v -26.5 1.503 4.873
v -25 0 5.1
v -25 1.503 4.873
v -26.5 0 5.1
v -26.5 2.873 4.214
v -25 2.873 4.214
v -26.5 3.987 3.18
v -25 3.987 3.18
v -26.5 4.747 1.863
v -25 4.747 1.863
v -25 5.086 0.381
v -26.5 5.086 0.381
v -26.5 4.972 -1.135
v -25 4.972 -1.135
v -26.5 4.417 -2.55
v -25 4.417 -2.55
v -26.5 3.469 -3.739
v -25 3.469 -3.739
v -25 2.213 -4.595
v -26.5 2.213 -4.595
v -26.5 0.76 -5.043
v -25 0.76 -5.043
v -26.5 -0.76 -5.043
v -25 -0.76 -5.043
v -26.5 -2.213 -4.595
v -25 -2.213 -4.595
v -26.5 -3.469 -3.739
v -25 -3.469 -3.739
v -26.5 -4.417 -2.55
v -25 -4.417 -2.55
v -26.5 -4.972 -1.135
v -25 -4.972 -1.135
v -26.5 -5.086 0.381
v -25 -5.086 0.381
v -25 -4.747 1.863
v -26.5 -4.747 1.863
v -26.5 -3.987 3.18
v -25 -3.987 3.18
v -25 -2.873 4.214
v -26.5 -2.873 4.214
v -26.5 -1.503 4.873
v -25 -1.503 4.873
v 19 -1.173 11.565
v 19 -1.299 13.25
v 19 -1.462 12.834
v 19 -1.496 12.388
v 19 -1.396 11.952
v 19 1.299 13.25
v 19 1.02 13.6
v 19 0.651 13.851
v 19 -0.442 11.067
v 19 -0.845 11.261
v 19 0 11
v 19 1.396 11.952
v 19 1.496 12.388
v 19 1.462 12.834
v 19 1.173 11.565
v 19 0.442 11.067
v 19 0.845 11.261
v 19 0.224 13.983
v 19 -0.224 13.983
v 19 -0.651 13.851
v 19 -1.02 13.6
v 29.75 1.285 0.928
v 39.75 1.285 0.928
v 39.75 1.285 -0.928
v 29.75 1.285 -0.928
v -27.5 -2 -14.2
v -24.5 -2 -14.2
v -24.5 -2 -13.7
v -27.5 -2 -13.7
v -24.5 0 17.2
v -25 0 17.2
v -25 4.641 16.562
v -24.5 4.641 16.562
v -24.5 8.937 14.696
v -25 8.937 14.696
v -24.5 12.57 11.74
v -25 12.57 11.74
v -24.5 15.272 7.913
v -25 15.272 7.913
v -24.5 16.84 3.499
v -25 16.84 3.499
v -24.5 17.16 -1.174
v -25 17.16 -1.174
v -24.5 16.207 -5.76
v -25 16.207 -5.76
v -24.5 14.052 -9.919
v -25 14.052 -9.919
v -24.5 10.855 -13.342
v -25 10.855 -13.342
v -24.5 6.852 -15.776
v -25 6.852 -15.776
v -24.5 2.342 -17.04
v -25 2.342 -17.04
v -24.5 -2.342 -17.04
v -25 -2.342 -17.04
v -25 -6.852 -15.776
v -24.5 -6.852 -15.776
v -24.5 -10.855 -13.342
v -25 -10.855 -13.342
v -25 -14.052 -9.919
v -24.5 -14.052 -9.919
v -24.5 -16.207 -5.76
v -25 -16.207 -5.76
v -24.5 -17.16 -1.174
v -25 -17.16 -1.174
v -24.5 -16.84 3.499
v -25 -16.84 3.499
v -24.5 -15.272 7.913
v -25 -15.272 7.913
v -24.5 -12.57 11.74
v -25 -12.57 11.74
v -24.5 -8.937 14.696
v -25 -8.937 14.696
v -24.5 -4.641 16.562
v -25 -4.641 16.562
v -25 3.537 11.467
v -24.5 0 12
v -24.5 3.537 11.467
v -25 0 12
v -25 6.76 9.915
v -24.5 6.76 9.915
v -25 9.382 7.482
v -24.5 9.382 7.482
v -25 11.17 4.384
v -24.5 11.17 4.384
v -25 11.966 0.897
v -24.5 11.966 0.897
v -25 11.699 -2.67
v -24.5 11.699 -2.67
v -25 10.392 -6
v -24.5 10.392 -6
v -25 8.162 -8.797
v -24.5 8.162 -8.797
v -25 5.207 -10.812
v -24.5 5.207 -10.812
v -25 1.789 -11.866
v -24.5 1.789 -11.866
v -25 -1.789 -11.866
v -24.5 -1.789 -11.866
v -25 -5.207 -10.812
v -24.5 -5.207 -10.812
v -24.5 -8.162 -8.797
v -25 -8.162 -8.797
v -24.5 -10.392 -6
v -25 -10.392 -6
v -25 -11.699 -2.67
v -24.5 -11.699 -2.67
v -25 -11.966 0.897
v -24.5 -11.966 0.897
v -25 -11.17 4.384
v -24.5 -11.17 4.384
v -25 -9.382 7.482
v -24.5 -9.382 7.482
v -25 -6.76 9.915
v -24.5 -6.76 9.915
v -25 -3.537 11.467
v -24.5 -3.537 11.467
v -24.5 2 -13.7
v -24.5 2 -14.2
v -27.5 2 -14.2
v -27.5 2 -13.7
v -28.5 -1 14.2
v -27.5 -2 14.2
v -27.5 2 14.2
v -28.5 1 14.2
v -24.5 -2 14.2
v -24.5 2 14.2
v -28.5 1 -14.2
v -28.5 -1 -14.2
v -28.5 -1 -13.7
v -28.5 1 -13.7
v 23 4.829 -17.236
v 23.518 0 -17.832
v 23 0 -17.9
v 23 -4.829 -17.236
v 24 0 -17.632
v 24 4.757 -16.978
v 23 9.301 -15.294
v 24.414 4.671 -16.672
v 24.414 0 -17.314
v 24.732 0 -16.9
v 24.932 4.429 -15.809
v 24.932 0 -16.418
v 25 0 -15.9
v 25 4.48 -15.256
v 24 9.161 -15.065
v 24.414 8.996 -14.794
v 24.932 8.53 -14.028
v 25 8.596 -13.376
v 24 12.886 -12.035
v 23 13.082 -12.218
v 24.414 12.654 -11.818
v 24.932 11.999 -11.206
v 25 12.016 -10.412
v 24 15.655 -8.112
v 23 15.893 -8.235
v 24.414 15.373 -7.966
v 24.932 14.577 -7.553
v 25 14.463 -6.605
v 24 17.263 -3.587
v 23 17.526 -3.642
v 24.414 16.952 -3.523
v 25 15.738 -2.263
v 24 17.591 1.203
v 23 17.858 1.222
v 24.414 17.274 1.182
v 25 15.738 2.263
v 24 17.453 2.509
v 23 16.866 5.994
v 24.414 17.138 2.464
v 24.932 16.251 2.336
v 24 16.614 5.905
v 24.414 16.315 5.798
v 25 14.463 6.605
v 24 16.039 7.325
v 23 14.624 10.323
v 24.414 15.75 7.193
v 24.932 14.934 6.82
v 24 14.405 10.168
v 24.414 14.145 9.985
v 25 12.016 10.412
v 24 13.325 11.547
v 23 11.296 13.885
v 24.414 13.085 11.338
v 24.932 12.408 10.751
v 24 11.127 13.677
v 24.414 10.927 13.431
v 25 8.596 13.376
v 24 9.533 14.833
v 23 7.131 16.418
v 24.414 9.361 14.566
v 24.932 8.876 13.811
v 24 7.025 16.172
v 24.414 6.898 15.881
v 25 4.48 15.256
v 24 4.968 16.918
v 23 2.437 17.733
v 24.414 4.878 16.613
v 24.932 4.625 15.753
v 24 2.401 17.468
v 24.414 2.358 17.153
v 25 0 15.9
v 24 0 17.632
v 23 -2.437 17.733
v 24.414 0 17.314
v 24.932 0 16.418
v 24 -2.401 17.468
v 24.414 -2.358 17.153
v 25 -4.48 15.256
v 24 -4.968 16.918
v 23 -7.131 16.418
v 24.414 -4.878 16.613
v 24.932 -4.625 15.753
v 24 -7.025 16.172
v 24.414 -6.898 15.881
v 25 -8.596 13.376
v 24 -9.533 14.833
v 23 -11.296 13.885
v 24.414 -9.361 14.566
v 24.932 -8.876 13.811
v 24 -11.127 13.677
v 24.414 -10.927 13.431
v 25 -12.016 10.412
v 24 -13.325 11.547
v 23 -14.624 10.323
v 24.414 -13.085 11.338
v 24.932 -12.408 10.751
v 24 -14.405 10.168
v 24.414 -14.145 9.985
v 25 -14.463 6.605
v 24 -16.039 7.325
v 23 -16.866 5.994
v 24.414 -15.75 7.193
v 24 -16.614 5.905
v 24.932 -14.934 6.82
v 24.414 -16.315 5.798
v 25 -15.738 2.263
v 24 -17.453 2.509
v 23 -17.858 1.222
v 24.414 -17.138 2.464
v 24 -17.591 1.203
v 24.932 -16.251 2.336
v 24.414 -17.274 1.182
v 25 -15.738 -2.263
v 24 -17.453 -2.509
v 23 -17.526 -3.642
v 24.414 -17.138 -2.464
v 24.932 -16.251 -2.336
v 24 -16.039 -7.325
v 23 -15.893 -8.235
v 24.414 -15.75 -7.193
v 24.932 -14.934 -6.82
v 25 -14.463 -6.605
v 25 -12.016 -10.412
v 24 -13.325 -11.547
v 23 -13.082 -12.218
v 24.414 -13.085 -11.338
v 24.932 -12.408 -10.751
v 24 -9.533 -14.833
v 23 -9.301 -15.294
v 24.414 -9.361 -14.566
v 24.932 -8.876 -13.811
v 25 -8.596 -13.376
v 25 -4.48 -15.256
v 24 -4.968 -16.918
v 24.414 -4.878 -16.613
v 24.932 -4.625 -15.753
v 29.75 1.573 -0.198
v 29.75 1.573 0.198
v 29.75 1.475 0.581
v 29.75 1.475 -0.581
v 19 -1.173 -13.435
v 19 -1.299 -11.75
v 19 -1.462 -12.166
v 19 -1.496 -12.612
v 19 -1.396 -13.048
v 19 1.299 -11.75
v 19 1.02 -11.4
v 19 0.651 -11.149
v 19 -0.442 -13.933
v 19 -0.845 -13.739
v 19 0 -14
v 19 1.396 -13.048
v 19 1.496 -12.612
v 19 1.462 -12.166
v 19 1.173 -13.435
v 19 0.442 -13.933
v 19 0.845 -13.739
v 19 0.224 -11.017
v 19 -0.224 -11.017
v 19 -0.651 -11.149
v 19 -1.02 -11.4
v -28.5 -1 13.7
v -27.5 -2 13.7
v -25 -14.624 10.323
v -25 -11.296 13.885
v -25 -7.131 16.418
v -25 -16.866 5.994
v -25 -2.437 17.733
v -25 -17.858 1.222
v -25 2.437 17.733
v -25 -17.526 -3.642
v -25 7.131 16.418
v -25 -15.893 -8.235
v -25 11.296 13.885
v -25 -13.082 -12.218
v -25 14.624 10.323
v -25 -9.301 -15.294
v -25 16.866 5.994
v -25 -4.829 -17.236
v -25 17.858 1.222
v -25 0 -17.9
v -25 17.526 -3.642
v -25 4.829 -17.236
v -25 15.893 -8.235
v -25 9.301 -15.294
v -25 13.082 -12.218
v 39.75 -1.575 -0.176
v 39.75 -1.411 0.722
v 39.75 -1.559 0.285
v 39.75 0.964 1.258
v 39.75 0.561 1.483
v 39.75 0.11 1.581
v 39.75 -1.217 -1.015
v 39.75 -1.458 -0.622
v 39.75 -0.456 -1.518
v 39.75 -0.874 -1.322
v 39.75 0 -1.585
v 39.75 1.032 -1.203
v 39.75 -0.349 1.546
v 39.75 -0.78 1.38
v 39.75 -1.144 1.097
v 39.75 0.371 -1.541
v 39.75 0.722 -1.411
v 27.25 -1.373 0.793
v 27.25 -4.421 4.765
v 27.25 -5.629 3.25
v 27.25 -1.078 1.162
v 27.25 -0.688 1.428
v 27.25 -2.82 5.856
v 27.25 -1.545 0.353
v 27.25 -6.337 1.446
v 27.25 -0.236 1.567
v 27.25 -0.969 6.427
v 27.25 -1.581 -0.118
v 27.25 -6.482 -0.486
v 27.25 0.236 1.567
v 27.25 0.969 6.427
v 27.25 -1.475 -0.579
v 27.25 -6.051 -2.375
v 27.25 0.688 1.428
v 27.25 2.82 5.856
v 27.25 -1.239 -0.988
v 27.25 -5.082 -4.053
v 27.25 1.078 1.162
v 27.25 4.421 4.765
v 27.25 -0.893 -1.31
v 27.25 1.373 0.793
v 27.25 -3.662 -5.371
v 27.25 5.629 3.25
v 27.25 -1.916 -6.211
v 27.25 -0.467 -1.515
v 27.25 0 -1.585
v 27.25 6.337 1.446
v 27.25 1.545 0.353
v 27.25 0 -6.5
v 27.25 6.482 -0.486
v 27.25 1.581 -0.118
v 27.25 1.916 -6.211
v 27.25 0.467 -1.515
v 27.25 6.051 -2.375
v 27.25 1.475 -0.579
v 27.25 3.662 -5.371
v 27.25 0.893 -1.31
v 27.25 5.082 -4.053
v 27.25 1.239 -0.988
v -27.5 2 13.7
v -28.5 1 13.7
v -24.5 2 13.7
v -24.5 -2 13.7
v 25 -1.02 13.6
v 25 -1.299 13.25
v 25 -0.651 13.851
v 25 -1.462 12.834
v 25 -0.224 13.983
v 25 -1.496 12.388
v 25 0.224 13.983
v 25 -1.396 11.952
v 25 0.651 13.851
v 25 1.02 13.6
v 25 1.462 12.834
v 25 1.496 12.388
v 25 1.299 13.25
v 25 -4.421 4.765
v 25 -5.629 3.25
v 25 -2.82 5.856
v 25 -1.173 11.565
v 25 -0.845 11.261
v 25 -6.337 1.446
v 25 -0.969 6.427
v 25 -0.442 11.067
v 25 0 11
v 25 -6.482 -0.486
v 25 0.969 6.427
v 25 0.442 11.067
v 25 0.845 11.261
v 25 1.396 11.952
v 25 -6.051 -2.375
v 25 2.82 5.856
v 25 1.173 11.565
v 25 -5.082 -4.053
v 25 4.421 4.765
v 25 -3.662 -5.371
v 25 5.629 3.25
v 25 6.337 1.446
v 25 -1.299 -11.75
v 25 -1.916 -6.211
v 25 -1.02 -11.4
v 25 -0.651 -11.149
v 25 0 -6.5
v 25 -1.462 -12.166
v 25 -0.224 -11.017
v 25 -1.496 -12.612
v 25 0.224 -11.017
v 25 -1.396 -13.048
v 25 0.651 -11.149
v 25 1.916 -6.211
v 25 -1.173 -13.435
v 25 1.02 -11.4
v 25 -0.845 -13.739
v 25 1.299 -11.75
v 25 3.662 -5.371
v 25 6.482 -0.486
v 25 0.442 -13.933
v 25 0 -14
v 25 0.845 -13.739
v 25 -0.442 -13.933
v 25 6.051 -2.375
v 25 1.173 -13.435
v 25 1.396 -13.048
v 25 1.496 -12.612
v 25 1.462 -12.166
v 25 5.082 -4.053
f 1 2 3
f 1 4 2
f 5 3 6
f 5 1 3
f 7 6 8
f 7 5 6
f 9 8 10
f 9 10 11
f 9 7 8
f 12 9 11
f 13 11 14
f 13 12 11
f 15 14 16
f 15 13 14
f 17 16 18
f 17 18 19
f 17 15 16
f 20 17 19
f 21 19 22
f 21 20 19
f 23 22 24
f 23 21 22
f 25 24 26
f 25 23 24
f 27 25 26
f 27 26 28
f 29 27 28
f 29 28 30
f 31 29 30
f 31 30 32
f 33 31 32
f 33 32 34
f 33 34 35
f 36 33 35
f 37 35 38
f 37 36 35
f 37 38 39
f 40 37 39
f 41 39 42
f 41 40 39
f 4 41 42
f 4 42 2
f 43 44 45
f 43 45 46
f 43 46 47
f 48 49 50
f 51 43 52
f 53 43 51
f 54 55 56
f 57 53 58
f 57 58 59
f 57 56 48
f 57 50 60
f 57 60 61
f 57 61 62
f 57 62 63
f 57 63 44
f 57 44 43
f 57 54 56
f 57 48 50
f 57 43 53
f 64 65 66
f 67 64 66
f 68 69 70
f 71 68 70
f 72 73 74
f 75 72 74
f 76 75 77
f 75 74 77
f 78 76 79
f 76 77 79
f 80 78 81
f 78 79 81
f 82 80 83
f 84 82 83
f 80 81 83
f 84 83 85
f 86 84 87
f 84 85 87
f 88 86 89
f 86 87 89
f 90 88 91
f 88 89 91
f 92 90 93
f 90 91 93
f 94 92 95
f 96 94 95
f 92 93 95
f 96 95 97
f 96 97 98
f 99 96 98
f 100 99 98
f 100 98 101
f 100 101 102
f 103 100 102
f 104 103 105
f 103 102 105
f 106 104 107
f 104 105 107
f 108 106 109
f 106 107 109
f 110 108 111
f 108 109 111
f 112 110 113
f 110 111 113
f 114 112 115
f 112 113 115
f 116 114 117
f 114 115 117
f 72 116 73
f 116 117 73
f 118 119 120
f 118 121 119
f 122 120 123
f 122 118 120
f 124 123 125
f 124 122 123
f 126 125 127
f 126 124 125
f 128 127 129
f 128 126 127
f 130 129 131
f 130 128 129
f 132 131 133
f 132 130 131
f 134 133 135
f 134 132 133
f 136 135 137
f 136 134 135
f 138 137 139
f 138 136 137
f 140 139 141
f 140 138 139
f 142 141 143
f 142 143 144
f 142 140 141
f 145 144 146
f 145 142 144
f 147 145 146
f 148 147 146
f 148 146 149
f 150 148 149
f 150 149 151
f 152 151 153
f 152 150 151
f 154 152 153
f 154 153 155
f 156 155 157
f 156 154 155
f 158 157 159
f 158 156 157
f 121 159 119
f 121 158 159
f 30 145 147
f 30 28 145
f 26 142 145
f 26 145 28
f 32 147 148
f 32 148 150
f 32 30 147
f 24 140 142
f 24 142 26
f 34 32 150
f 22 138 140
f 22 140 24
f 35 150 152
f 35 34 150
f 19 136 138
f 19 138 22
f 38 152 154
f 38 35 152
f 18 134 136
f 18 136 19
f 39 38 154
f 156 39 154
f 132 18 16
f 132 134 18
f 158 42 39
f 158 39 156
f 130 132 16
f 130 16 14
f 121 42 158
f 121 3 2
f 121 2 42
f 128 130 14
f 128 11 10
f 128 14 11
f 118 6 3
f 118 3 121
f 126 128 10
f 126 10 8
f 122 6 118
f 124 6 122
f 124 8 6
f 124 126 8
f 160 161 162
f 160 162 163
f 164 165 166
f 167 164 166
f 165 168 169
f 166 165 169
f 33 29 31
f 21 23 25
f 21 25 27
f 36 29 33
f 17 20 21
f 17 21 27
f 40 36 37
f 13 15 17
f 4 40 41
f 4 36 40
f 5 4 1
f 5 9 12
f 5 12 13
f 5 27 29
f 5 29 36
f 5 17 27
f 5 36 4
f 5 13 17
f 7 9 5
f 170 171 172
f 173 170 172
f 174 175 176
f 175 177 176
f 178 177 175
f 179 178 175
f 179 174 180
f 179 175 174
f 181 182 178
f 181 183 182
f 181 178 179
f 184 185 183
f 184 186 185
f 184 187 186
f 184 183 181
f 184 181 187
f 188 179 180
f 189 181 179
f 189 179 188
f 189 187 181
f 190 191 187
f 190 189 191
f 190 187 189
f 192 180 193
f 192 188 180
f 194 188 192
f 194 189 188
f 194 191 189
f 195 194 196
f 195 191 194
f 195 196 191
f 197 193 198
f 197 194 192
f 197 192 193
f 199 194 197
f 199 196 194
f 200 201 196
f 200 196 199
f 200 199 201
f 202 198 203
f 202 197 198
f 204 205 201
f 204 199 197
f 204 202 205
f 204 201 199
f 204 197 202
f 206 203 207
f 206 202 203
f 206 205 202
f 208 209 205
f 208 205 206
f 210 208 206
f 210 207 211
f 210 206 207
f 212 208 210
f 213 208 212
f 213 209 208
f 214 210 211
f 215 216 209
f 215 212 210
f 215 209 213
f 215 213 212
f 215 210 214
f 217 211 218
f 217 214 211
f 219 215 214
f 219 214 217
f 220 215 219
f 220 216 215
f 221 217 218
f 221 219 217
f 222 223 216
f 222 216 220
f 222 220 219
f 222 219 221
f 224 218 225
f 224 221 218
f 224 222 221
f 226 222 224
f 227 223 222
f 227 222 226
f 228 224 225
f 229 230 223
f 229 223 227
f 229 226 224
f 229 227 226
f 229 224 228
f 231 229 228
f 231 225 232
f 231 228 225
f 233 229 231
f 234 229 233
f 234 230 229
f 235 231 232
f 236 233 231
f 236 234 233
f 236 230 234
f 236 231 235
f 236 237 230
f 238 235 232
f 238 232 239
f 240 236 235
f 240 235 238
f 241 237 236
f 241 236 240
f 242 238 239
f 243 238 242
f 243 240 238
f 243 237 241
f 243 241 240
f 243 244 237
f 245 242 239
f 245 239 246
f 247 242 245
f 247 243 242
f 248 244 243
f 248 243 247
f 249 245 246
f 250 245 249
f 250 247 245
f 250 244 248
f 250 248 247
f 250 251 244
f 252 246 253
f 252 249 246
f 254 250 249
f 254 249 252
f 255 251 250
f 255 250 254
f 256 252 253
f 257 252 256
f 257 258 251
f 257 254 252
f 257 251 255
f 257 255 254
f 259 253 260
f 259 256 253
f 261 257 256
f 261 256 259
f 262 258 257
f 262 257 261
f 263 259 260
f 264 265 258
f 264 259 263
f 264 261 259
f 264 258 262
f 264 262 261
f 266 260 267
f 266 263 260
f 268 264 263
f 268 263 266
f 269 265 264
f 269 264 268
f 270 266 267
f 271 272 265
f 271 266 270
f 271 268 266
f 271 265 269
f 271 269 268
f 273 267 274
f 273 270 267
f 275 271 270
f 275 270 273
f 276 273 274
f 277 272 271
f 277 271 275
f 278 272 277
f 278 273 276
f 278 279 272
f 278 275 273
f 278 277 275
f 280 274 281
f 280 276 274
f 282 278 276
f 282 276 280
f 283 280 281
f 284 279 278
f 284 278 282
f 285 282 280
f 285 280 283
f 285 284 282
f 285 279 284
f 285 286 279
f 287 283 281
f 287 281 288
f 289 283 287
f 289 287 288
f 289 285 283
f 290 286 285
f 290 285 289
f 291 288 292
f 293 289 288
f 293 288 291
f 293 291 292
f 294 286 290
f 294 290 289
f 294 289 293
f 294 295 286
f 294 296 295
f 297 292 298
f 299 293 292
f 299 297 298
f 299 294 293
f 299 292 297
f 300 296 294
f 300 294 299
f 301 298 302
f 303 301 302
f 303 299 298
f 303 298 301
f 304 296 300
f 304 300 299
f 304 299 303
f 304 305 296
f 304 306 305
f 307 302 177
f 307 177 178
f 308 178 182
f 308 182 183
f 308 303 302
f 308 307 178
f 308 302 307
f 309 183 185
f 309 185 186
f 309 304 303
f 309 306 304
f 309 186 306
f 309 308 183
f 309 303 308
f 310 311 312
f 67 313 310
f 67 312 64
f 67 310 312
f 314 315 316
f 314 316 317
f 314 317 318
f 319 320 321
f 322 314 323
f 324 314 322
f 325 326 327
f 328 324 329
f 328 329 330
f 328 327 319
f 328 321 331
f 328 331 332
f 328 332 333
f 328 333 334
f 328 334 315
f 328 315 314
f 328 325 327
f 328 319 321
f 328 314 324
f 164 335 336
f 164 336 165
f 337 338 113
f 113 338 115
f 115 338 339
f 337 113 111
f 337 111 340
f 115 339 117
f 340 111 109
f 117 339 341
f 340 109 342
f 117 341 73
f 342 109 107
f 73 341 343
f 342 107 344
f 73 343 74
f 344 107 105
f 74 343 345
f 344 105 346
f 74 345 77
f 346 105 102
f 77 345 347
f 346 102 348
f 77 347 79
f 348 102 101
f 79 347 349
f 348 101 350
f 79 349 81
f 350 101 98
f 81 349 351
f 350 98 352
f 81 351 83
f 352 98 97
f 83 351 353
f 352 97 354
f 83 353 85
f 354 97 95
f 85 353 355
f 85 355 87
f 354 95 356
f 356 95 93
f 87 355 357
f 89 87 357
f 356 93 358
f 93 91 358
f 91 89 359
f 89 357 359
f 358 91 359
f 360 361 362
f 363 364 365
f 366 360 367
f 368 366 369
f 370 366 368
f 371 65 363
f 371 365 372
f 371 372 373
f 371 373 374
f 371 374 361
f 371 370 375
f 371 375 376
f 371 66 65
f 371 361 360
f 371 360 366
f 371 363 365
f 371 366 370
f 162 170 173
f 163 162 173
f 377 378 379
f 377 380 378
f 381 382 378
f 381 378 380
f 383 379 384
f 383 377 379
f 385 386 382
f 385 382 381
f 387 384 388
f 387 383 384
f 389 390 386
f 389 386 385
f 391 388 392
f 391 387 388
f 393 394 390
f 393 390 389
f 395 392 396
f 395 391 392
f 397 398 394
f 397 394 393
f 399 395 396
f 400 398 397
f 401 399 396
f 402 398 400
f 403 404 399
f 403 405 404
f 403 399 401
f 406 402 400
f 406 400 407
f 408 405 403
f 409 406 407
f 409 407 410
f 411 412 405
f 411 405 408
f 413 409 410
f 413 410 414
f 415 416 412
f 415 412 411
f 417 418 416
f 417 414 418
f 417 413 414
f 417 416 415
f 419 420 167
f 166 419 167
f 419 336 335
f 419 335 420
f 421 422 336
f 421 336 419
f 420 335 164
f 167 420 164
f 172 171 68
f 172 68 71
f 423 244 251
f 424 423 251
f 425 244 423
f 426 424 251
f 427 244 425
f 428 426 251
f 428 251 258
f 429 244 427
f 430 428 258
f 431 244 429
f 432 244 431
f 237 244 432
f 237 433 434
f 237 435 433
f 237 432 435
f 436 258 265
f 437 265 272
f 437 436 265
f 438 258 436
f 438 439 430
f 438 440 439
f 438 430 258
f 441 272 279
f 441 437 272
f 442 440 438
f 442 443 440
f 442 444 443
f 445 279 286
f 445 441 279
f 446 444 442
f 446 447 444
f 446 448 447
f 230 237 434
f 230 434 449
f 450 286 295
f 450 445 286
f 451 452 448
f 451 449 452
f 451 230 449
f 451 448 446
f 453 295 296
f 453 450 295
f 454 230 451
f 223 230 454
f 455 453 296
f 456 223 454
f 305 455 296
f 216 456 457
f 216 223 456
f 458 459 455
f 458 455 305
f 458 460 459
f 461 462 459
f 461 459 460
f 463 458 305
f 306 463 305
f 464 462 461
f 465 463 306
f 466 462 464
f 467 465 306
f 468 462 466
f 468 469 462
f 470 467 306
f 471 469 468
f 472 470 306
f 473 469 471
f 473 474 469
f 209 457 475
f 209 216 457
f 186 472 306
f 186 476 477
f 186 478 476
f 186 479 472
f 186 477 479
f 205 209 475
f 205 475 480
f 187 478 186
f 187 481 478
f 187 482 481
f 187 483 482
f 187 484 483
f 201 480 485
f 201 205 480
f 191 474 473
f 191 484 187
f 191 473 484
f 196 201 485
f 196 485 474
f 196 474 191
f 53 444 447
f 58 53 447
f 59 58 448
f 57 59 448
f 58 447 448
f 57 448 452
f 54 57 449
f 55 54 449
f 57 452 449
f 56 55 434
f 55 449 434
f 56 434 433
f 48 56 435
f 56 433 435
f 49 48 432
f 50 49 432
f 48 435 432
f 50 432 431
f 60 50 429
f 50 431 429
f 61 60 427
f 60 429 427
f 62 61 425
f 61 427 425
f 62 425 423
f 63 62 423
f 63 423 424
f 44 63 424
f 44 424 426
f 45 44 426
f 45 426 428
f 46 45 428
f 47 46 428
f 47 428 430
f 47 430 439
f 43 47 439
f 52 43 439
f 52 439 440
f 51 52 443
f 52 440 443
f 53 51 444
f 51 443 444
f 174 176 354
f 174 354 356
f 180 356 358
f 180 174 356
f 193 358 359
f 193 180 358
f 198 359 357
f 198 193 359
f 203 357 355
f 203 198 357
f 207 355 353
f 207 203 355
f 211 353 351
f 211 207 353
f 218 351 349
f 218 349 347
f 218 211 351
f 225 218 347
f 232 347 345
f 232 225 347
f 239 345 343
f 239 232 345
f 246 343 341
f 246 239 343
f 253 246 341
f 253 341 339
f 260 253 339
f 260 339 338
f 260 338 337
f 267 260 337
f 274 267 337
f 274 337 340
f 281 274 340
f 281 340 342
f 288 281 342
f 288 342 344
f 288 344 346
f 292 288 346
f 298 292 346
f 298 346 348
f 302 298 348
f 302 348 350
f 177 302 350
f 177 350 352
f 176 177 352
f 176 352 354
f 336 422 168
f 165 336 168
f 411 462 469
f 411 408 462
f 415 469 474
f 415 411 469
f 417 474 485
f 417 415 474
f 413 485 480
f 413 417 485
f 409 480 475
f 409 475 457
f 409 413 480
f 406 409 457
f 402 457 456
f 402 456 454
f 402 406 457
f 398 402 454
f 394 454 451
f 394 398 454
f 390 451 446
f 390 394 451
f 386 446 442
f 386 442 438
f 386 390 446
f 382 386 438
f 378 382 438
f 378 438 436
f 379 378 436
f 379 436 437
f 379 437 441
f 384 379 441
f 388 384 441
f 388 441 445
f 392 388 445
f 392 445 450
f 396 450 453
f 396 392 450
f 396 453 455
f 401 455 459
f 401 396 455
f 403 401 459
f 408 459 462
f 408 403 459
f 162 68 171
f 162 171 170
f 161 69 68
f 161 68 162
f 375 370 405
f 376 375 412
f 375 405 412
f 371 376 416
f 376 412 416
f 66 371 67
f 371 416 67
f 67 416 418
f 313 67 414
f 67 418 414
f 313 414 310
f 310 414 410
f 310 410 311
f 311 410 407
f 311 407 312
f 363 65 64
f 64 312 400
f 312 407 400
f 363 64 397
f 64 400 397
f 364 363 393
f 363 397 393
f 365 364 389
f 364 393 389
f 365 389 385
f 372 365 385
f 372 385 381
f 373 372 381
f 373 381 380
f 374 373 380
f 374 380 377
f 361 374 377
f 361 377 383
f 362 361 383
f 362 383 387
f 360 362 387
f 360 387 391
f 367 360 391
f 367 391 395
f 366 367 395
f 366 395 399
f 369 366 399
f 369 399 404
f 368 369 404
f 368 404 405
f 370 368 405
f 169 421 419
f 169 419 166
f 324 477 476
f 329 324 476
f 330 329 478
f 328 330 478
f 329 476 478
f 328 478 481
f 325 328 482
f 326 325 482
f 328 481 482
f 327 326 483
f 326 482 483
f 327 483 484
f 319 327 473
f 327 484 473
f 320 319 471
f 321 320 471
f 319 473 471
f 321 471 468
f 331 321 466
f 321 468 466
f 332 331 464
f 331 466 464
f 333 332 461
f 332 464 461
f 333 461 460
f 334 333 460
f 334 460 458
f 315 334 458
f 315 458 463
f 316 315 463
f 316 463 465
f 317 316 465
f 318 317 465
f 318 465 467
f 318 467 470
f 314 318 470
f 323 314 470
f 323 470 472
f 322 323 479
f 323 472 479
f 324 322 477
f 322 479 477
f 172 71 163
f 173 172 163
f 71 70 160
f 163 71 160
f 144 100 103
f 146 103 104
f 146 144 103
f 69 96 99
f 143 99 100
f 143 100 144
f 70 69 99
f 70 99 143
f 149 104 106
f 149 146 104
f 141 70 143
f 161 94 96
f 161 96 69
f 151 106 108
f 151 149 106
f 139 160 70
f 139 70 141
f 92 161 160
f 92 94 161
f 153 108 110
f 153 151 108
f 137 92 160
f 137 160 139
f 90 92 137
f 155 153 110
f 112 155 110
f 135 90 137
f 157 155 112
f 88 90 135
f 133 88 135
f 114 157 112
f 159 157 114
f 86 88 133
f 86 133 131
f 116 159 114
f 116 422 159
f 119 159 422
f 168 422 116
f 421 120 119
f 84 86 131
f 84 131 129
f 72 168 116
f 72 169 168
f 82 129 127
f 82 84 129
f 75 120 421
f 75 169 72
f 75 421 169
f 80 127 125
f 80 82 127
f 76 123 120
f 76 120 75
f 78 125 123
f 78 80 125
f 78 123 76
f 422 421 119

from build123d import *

# Parameters (mm, degrees)
SKETCH1_R           = 17.9
MOTOR_BODY_DEPTH    = 25
SKETCH2_R           = 17.2
CUT_EXTRUDE1_DEPTH  = 0.5
SKETCH3_R           = 12
BOSS_EXTRUDE2_DEPTH = 0.5
SKETCH4_R           = 5.1
BOSS_EXTRUDE3_DEPTH = 1.5
FILLET1_R           = 2
SKETCH5_W           = 0.5
SKETCH5_H           = 4
BOSS_EXTRUDE4_DEPTH = 4
CHAMFER1_SIZE       = 1
SKETCH6_R           = 1.5
MOUNT_HOLES_DEPTH   = 6
SKETCH7_R           = 6.5
BOSS_EXTRUDE5_DEPTH = 2.25
SKETCH8_R           = 1.585
OUTPUT_SHAFT_DEPTH  = 12.5
CUT_EXTRUDE3_DEPTH  = 10


with BuildPart() as part:
    # Sketch1 → Motor-Body (new body, symmetric)
    with BuildSketch(Plane(origin=(0, 0, 0), x_dir=(0, 0, -1), z_dir=(1, 0, 0))):
        Circle(SKETCH1_R)
    extrude(amount=MOTOR_BODY_DEPTH, both=True)

    # Sketch2 → Cut-Extrude1 (cut)
    with BuildSketch(Plane.ZY.offset(25)):
        Circle(SKETCH2_R)
    extrude(amount=-CUT_EXTRUDE1_DEPTH, mode=Mode.SUBTRACT)

    # Sketch3 → Boss-Extrude2 (add, symmetric)
    with BuildSketch(Plane.ZY.offset(24.5)):
        Circle(SKETCH3_R)
    extrude(amount=BOSS_EXTRUDE2_DEPTH, both=True)

    # Sketch4 → Boss-Extrude3 (add, symmetric)
    with BuildSketch(Plane.ZY.offset(25)):
        Circle(SKETCH4_R)
    extrude(amount=BOSS_EXTRUDE3_DEPTH, both=True)

    # Fillet1
    fillet1_edges = [part.edges().sort_by_distance(p)[0] for p in [
        (25, 0, 17.9),
    ]]
    fillet(fillet1_edges, radius=FILLET1_R)

    # Sketch5 → Boss-Extrude4 (add)
    with BuildSketch(Plane.ZY.offset(24.5)):
        with Locations((-13.95, 0)):
            Rectangle(SKETCH5_W, SKETCH5_H)
        with Locations((13.95, 0)):
            Rectangle(SKETCH5_W, SKETCH5_H)
    extrude(amount=BOSS_EXTRUDE4_DEPTH)

    # Chamfer1
    chamfer1_edges = [part.edges().sort_by_distance(p)[0] for p in [
        (-28.5, 2, -13.95),
        (-28.5, -2, -13.95),
        (-28.5, 2, 13.95),
        (-28.5, -2, 13.95),
    ]]
    chamfer(chamfer1_edges, length=CHAMFER1_SIZE)

    # Sketch6 → Mount-Holes (cut)
    with BuildSketch(Plane(origin=(25, 0, 0), x_dir=(0, 0, -1), z_dir=(1, 0, 0))):
        with Locations((-12.5, 0)):
            Circle(SKETCH6_R)
        with Locations((12.5, 0)):
            Circle(SKETCH6_R)
    extrude(amount=-MOUNT_HOLES_DEPTH, mode=Mode.SUBTRACT)

    # Sketch7 → Boss-Extrude5 (add, symmetric)
    with BuildSketch(Plane(origin=(25, 0, 0), x_dir=(0, 0, -1), z_dir=(1, 0, 0))):
        Circle(SKETCH7_R)
    extrude(amount=BOSS_EXTRUDE5_DEPTH, both=True)

    # Sketch8 → Output-Shaft (add)
    with BuildSketch(Plane(origin=(27.25, 0, 0), x_dir=(0, 0, -1), z_dir=(1, 0, 0))):
        Circle(SKETCH8_R)
    extrude(amount=OUTPUT_SHAFT_DEPTH)

    # Sketch9 → Cut-Extrude3 (cut)
    with BuildSketch(Plane(origin=(39.75, 0, 0), x_dir=(0, 0, -1), z_dir=(1, 0, 0))):
        with BuildLine():
            Line((-0.927900857, 1.285), (0.927900857, 1.285))
            ThreePointArc((0.927900857, 1.285), (0, 1.585), (-0.927900857, 1.285))
        make_face()
    extrude(amount=-CUT_EXTRUDE3_DEPTH, mode=Mode.SUBTRACT)


solid = part.part
